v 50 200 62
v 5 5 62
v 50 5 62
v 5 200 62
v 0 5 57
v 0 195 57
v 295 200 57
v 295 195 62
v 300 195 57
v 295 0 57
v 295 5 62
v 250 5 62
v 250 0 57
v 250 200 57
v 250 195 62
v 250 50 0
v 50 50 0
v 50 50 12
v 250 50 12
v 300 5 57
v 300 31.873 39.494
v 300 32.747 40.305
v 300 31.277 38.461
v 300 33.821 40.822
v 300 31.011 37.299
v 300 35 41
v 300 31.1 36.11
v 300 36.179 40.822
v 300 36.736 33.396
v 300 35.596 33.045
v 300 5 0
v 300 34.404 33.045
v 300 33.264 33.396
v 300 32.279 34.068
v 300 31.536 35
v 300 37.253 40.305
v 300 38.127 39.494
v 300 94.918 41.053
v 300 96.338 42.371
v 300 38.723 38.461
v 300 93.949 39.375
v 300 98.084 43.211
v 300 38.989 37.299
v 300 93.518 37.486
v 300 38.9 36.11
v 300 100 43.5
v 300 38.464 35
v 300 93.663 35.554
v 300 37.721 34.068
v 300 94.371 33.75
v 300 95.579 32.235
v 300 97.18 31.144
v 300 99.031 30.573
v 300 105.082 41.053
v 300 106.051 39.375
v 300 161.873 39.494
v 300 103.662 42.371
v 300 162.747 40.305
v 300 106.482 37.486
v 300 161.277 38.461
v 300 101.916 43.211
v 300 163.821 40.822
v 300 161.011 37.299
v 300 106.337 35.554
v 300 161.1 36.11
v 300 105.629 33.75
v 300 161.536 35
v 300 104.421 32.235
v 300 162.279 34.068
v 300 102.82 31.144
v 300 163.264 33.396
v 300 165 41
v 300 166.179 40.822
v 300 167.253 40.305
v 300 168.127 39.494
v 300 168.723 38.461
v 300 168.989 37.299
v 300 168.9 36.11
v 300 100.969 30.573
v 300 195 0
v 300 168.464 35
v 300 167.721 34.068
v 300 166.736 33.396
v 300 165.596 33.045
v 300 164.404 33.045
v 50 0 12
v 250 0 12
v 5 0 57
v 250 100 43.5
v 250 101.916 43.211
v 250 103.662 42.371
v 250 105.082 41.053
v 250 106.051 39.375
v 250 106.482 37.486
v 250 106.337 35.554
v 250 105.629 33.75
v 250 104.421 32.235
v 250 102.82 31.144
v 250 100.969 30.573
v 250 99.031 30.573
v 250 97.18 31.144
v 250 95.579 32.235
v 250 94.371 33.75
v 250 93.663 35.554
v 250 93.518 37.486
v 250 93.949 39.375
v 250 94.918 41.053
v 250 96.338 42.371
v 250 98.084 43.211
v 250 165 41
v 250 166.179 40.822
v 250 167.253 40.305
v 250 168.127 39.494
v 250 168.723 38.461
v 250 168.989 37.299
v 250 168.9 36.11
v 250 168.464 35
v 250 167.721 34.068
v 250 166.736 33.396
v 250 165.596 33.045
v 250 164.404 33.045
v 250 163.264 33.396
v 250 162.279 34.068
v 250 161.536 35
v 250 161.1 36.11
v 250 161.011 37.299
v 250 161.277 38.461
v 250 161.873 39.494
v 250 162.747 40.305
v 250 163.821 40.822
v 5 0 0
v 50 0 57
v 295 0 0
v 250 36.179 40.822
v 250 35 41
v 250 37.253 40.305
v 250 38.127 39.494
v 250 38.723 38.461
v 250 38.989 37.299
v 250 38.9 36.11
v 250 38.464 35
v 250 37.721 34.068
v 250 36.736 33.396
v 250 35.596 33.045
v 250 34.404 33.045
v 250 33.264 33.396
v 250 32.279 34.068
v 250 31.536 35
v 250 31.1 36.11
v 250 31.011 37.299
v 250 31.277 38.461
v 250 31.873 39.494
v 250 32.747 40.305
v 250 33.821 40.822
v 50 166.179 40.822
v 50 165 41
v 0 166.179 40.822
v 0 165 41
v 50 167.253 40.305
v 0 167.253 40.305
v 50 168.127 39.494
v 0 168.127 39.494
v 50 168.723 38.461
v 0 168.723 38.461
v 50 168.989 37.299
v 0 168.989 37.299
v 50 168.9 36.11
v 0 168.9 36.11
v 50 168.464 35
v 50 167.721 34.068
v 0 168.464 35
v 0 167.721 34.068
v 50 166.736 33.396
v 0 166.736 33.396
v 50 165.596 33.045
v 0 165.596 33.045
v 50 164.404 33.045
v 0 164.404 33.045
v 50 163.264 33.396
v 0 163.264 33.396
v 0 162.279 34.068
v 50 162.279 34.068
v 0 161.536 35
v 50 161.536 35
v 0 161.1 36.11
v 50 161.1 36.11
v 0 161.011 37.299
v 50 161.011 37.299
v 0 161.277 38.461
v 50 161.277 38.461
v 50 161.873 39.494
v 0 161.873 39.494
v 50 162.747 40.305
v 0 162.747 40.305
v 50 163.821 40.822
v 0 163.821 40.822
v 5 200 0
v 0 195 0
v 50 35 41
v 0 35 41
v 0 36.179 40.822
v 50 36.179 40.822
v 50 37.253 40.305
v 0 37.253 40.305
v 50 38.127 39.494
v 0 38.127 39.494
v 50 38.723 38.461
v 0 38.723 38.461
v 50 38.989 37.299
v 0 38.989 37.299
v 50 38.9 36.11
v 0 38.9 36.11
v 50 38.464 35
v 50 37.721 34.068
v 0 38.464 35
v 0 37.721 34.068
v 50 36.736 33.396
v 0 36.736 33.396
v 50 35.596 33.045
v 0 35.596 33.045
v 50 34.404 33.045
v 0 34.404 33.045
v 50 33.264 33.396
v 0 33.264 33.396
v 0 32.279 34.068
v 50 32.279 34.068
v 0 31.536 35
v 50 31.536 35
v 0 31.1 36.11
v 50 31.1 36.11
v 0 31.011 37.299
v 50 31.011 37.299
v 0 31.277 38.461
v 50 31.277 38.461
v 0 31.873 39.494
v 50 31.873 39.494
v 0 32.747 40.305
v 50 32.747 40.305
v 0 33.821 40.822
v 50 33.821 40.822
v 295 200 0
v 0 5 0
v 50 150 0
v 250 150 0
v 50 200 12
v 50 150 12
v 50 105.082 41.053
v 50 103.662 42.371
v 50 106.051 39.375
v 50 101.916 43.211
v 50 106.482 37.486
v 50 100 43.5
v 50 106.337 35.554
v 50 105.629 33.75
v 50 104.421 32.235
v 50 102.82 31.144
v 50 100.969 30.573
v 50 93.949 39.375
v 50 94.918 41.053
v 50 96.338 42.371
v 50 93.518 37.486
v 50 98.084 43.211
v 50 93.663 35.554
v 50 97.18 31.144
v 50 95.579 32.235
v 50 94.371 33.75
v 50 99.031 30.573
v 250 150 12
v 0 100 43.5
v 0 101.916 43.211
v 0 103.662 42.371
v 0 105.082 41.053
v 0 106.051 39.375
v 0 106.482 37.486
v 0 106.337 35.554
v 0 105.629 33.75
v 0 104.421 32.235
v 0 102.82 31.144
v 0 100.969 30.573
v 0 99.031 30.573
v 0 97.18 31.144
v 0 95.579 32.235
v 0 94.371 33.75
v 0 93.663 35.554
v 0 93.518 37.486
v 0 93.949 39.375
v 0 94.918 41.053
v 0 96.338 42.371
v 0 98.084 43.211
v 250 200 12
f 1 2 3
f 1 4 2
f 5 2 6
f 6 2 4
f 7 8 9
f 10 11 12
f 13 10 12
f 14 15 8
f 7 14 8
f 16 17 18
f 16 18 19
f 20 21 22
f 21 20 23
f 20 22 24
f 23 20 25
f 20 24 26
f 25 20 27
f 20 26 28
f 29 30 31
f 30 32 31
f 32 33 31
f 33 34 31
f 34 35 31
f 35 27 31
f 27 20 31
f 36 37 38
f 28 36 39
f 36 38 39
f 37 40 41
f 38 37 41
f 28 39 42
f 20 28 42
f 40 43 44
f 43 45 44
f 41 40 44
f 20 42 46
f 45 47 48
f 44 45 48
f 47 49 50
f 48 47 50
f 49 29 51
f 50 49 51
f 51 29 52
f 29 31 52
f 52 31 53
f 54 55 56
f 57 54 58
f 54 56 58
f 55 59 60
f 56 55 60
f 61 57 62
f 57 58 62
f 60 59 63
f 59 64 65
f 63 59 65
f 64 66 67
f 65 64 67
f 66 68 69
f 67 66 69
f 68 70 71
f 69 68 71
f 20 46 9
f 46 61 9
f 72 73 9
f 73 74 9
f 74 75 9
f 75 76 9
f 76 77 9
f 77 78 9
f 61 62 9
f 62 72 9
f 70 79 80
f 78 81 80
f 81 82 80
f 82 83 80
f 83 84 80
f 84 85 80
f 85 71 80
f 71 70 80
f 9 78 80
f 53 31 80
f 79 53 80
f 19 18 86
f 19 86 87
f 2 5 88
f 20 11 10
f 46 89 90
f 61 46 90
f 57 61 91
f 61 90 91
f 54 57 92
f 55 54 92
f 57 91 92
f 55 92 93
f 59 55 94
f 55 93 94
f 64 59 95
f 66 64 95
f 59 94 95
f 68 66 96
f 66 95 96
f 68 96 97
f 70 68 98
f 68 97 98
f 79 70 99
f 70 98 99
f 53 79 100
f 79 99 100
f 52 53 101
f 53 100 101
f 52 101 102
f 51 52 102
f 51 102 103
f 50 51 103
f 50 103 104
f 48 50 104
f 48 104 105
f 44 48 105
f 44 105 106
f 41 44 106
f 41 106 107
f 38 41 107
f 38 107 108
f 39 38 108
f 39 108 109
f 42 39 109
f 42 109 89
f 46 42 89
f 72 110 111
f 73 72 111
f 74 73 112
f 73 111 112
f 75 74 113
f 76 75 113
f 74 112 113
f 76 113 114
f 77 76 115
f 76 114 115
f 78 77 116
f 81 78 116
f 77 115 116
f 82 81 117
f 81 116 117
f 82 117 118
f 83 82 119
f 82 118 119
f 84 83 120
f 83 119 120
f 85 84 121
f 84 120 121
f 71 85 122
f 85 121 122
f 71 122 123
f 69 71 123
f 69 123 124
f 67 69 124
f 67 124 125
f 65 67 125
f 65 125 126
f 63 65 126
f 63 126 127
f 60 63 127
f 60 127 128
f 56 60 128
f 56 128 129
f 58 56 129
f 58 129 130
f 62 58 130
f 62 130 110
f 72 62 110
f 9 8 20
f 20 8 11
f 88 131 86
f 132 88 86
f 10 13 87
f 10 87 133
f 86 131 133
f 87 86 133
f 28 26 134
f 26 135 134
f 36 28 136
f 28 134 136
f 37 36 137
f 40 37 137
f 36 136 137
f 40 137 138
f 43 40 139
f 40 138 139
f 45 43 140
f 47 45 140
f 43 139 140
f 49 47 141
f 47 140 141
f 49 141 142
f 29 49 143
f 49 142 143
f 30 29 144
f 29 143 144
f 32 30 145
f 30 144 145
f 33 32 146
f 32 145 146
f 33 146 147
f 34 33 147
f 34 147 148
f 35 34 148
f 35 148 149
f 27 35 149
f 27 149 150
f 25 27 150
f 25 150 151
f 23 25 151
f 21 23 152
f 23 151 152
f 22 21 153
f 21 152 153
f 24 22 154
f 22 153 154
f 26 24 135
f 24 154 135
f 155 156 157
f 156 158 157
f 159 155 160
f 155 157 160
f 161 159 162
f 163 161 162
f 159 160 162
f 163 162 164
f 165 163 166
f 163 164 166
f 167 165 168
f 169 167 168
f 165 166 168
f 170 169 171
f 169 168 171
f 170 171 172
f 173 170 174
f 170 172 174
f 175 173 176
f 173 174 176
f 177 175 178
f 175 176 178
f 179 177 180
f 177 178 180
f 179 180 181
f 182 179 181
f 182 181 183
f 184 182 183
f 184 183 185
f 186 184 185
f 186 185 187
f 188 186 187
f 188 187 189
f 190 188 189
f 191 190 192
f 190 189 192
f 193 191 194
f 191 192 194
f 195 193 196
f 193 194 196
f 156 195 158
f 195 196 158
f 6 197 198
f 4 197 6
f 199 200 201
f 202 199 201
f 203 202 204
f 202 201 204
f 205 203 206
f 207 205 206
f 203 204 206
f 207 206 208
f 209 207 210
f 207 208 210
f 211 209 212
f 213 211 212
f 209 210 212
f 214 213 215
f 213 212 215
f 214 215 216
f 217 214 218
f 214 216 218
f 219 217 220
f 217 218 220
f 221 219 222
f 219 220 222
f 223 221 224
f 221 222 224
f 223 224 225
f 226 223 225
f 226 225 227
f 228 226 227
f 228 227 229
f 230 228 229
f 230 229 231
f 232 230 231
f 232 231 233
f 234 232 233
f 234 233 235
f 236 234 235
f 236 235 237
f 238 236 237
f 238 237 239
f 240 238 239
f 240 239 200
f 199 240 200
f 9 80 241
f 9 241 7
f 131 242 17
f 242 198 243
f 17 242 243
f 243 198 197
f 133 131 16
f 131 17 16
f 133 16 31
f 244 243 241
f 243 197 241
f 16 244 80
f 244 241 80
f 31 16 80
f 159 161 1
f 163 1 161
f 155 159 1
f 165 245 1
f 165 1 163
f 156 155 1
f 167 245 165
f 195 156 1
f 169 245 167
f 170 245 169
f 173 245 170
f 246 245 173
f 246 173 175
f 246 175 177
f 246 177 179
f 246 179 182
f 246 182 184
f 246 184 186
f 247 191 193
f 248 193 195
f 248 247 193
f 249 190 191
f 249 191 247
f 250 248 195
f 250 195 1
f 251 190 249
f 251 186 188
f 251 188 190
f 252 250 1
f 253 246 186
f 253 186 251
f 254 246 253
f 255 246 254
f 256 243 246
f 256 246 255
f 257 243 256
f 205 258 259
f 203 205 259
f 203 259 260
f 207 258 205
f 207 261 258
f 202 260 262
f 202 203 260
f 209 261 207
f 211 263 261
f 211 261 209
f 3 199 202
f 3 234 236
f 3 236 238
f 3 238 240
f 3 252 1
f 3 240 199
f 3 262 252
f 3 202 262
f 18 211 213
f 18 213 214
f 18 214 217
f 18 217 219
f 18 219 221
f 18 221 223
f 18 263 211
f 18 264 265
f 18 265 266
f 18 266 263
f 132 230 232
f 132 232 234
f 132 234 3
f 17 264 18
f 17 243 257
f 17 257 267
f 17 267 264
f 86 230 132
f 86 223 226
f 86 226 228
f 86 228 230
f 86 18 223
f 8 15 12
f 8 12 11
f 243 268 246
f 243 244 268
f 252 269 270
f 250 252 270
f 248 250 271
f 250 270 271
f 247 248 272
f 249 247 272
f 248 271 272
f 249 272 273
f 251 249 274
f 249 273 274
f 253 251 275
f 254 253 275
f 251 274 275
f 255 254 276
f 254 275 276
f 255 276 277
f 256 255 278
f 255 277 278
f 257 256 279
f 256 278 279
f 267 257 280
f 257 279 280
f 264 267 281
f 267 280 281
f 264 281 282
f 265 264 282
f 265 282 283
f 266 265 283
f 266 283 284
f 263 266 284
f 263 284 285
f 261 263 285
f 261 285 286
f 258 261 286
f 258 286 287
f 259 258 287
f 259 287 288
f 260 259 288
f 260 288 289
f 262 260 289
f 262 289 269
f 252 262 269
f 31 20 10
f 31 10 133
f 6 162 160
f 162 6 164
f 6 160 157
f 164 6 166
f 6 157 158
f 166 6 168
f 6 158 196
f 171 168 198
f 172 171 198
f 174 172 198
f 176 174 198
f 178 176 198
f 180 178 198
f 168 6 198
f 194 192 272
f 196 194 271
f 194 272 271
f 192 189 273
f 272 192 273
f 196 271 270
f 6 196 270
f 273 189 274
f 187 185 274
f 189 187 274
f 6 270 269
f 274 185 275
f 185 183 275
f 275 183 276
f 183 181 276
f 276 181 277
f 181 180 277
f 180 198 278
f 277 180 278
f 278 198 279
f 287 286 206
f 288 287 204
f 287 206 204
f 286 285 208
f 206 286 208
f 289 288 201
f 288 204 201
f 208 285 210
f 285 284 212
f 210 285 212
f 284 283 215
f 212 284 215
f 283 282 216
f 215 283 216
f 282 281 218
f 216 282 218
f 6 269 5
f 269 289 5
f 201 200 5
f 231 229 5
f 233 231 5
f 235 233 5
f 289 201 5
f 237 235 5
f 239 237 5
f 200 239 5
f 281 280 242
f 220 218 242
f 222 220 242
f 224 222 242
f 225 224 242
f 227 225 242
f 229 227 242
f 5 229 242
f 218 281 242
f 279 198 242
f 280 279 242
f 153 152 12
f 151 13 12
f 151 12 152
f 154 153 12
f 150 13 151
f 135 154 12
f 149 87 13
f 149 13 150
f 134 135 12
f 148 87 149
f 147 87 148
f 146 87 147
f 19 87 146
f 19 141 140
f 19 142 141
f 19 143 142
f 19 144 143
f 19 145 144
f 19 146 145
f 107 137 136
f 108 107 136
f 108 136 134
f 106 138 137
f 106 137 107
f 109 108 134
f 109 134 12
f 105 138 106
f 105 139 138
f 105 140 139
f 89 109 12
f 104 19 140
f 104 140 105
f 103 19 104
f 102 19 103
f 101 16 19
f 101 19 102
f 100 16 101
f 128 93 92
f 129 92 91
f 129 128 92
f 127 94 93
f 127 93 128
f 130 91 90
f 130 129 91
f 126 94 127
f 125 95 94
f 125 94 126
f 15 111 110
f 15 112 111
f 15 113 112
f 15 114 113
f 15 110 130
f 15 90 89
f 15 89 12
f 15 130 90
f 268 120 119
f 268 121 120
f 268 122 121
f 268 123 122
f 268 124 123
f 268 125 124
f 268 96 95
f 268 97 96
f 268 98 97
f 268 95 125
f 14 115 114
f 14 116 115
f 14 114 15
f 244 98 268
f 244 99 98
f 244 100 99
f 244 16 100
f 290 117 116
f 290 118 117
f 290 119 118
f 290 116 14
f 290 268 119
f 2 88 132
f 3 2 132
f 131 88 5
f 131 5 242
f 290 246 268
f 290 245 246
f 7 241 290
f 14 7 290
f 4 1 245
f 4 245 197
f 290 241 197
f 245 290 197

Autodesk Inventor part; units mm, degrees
ref_plane "YZ Plane" through (0, 0, 0) normal (1, 0, 0) x (0, 1, 0)
ref_plane "XZ Plane" through (0, 0, 0) normal (0, 1, 0) x (-1, 0, 0)
ref_plane "XY Plane" through (0, 0, 0) normal (0, 0, 1) x (1, 0, 0)
sketch "Sketch1" plane through (0, 0, 0) normal (0, 0, 1) x (1, 0, 0)
  line L0 (0, 0) -> (300, 0)
  line L1 (300, 0) -> (300, 200)
  line L2 (300, 200) -> (0, 200)
  line L3 (0, 200) -> (0, 0)
  dimension "d0" = 300
  dimension "d1" = 200
extrude "Extrusion1" add sketch "Sketch1" along normal blind 12
sketch "Sketch2" plane through (0, 0, 0) normal (0, 0, -1) x (-1, 0, 0)
  line L0 (-250, 150) -> (-50, 150)
  line L1 (-50, 150) -> (-50, 50)
  line L2 (-50, 50) -> (-250, 50)
  line L3 (-250, 50) -> (-250, 150)
  point P0 (0, 0)
  dimension "d4" = 200
  dimension "d5" = 100
extrude "Extrusion2" cut sketch "Sketch2" against normal blind 19
sketch "Sketch3" plane through (0, 0, 12) normal (0, 0, 1) x (1, 0, 0)
  line L0 (0, 0) -> (300, 0) projected
  line L1 (300, 0) -> (250, 0)
  line L2 (250, 0) -> (250, 200)
  line L3 (250, 200) -> (300, 200)
  line L4 (300, 200) -> (300, 0)
  line L5 (0, 0) -> (50, 0)
  line L6 (50, 0) -> (50, 200)
  line L7 (50, 200) -> (0, 200)
  line L8 (0, 200) -> (0, 0)
  dimension "d8" = 50
  dimension "d9" = 200
  dimension "d10" = 50
  dimension "d11" = 200
extrude "Extrusion3" add sketch "Sketch3" along normal blind 50
sketch "Sketch4" plane through (0, 0, 0) normal (-1, 0, 0) x (0, 0, 1)
  point P0 (0, 0)
sketch "Sketch5" plane through (0, 0, 0) normal (-1, 0, 0) x (0, 0, 1)
  circle A0 centre (37, 35) radius 4
  circle A1 centre (37, 100) radius 6.5
  circle A2 centre (37, 165) radius 4
  point P0 (0, 0)
  dimension "d14" = 8
  dimension "d15" = 13
  dimension "d16" = 8
extrude "Extrusion4" cut sketch "Sketch5" against normal blind 900
chamfer "Chamfer1" distance 5 angle 45 9 edges at (0, 100, 62) (0, 0, 31) (25, 0, 62) (275, 0, 62) (300, 100, 62) (275, 200, 62) (300, 200, 31) (0, 200, 31) (300, 0, 31)
properties part number "base box"
